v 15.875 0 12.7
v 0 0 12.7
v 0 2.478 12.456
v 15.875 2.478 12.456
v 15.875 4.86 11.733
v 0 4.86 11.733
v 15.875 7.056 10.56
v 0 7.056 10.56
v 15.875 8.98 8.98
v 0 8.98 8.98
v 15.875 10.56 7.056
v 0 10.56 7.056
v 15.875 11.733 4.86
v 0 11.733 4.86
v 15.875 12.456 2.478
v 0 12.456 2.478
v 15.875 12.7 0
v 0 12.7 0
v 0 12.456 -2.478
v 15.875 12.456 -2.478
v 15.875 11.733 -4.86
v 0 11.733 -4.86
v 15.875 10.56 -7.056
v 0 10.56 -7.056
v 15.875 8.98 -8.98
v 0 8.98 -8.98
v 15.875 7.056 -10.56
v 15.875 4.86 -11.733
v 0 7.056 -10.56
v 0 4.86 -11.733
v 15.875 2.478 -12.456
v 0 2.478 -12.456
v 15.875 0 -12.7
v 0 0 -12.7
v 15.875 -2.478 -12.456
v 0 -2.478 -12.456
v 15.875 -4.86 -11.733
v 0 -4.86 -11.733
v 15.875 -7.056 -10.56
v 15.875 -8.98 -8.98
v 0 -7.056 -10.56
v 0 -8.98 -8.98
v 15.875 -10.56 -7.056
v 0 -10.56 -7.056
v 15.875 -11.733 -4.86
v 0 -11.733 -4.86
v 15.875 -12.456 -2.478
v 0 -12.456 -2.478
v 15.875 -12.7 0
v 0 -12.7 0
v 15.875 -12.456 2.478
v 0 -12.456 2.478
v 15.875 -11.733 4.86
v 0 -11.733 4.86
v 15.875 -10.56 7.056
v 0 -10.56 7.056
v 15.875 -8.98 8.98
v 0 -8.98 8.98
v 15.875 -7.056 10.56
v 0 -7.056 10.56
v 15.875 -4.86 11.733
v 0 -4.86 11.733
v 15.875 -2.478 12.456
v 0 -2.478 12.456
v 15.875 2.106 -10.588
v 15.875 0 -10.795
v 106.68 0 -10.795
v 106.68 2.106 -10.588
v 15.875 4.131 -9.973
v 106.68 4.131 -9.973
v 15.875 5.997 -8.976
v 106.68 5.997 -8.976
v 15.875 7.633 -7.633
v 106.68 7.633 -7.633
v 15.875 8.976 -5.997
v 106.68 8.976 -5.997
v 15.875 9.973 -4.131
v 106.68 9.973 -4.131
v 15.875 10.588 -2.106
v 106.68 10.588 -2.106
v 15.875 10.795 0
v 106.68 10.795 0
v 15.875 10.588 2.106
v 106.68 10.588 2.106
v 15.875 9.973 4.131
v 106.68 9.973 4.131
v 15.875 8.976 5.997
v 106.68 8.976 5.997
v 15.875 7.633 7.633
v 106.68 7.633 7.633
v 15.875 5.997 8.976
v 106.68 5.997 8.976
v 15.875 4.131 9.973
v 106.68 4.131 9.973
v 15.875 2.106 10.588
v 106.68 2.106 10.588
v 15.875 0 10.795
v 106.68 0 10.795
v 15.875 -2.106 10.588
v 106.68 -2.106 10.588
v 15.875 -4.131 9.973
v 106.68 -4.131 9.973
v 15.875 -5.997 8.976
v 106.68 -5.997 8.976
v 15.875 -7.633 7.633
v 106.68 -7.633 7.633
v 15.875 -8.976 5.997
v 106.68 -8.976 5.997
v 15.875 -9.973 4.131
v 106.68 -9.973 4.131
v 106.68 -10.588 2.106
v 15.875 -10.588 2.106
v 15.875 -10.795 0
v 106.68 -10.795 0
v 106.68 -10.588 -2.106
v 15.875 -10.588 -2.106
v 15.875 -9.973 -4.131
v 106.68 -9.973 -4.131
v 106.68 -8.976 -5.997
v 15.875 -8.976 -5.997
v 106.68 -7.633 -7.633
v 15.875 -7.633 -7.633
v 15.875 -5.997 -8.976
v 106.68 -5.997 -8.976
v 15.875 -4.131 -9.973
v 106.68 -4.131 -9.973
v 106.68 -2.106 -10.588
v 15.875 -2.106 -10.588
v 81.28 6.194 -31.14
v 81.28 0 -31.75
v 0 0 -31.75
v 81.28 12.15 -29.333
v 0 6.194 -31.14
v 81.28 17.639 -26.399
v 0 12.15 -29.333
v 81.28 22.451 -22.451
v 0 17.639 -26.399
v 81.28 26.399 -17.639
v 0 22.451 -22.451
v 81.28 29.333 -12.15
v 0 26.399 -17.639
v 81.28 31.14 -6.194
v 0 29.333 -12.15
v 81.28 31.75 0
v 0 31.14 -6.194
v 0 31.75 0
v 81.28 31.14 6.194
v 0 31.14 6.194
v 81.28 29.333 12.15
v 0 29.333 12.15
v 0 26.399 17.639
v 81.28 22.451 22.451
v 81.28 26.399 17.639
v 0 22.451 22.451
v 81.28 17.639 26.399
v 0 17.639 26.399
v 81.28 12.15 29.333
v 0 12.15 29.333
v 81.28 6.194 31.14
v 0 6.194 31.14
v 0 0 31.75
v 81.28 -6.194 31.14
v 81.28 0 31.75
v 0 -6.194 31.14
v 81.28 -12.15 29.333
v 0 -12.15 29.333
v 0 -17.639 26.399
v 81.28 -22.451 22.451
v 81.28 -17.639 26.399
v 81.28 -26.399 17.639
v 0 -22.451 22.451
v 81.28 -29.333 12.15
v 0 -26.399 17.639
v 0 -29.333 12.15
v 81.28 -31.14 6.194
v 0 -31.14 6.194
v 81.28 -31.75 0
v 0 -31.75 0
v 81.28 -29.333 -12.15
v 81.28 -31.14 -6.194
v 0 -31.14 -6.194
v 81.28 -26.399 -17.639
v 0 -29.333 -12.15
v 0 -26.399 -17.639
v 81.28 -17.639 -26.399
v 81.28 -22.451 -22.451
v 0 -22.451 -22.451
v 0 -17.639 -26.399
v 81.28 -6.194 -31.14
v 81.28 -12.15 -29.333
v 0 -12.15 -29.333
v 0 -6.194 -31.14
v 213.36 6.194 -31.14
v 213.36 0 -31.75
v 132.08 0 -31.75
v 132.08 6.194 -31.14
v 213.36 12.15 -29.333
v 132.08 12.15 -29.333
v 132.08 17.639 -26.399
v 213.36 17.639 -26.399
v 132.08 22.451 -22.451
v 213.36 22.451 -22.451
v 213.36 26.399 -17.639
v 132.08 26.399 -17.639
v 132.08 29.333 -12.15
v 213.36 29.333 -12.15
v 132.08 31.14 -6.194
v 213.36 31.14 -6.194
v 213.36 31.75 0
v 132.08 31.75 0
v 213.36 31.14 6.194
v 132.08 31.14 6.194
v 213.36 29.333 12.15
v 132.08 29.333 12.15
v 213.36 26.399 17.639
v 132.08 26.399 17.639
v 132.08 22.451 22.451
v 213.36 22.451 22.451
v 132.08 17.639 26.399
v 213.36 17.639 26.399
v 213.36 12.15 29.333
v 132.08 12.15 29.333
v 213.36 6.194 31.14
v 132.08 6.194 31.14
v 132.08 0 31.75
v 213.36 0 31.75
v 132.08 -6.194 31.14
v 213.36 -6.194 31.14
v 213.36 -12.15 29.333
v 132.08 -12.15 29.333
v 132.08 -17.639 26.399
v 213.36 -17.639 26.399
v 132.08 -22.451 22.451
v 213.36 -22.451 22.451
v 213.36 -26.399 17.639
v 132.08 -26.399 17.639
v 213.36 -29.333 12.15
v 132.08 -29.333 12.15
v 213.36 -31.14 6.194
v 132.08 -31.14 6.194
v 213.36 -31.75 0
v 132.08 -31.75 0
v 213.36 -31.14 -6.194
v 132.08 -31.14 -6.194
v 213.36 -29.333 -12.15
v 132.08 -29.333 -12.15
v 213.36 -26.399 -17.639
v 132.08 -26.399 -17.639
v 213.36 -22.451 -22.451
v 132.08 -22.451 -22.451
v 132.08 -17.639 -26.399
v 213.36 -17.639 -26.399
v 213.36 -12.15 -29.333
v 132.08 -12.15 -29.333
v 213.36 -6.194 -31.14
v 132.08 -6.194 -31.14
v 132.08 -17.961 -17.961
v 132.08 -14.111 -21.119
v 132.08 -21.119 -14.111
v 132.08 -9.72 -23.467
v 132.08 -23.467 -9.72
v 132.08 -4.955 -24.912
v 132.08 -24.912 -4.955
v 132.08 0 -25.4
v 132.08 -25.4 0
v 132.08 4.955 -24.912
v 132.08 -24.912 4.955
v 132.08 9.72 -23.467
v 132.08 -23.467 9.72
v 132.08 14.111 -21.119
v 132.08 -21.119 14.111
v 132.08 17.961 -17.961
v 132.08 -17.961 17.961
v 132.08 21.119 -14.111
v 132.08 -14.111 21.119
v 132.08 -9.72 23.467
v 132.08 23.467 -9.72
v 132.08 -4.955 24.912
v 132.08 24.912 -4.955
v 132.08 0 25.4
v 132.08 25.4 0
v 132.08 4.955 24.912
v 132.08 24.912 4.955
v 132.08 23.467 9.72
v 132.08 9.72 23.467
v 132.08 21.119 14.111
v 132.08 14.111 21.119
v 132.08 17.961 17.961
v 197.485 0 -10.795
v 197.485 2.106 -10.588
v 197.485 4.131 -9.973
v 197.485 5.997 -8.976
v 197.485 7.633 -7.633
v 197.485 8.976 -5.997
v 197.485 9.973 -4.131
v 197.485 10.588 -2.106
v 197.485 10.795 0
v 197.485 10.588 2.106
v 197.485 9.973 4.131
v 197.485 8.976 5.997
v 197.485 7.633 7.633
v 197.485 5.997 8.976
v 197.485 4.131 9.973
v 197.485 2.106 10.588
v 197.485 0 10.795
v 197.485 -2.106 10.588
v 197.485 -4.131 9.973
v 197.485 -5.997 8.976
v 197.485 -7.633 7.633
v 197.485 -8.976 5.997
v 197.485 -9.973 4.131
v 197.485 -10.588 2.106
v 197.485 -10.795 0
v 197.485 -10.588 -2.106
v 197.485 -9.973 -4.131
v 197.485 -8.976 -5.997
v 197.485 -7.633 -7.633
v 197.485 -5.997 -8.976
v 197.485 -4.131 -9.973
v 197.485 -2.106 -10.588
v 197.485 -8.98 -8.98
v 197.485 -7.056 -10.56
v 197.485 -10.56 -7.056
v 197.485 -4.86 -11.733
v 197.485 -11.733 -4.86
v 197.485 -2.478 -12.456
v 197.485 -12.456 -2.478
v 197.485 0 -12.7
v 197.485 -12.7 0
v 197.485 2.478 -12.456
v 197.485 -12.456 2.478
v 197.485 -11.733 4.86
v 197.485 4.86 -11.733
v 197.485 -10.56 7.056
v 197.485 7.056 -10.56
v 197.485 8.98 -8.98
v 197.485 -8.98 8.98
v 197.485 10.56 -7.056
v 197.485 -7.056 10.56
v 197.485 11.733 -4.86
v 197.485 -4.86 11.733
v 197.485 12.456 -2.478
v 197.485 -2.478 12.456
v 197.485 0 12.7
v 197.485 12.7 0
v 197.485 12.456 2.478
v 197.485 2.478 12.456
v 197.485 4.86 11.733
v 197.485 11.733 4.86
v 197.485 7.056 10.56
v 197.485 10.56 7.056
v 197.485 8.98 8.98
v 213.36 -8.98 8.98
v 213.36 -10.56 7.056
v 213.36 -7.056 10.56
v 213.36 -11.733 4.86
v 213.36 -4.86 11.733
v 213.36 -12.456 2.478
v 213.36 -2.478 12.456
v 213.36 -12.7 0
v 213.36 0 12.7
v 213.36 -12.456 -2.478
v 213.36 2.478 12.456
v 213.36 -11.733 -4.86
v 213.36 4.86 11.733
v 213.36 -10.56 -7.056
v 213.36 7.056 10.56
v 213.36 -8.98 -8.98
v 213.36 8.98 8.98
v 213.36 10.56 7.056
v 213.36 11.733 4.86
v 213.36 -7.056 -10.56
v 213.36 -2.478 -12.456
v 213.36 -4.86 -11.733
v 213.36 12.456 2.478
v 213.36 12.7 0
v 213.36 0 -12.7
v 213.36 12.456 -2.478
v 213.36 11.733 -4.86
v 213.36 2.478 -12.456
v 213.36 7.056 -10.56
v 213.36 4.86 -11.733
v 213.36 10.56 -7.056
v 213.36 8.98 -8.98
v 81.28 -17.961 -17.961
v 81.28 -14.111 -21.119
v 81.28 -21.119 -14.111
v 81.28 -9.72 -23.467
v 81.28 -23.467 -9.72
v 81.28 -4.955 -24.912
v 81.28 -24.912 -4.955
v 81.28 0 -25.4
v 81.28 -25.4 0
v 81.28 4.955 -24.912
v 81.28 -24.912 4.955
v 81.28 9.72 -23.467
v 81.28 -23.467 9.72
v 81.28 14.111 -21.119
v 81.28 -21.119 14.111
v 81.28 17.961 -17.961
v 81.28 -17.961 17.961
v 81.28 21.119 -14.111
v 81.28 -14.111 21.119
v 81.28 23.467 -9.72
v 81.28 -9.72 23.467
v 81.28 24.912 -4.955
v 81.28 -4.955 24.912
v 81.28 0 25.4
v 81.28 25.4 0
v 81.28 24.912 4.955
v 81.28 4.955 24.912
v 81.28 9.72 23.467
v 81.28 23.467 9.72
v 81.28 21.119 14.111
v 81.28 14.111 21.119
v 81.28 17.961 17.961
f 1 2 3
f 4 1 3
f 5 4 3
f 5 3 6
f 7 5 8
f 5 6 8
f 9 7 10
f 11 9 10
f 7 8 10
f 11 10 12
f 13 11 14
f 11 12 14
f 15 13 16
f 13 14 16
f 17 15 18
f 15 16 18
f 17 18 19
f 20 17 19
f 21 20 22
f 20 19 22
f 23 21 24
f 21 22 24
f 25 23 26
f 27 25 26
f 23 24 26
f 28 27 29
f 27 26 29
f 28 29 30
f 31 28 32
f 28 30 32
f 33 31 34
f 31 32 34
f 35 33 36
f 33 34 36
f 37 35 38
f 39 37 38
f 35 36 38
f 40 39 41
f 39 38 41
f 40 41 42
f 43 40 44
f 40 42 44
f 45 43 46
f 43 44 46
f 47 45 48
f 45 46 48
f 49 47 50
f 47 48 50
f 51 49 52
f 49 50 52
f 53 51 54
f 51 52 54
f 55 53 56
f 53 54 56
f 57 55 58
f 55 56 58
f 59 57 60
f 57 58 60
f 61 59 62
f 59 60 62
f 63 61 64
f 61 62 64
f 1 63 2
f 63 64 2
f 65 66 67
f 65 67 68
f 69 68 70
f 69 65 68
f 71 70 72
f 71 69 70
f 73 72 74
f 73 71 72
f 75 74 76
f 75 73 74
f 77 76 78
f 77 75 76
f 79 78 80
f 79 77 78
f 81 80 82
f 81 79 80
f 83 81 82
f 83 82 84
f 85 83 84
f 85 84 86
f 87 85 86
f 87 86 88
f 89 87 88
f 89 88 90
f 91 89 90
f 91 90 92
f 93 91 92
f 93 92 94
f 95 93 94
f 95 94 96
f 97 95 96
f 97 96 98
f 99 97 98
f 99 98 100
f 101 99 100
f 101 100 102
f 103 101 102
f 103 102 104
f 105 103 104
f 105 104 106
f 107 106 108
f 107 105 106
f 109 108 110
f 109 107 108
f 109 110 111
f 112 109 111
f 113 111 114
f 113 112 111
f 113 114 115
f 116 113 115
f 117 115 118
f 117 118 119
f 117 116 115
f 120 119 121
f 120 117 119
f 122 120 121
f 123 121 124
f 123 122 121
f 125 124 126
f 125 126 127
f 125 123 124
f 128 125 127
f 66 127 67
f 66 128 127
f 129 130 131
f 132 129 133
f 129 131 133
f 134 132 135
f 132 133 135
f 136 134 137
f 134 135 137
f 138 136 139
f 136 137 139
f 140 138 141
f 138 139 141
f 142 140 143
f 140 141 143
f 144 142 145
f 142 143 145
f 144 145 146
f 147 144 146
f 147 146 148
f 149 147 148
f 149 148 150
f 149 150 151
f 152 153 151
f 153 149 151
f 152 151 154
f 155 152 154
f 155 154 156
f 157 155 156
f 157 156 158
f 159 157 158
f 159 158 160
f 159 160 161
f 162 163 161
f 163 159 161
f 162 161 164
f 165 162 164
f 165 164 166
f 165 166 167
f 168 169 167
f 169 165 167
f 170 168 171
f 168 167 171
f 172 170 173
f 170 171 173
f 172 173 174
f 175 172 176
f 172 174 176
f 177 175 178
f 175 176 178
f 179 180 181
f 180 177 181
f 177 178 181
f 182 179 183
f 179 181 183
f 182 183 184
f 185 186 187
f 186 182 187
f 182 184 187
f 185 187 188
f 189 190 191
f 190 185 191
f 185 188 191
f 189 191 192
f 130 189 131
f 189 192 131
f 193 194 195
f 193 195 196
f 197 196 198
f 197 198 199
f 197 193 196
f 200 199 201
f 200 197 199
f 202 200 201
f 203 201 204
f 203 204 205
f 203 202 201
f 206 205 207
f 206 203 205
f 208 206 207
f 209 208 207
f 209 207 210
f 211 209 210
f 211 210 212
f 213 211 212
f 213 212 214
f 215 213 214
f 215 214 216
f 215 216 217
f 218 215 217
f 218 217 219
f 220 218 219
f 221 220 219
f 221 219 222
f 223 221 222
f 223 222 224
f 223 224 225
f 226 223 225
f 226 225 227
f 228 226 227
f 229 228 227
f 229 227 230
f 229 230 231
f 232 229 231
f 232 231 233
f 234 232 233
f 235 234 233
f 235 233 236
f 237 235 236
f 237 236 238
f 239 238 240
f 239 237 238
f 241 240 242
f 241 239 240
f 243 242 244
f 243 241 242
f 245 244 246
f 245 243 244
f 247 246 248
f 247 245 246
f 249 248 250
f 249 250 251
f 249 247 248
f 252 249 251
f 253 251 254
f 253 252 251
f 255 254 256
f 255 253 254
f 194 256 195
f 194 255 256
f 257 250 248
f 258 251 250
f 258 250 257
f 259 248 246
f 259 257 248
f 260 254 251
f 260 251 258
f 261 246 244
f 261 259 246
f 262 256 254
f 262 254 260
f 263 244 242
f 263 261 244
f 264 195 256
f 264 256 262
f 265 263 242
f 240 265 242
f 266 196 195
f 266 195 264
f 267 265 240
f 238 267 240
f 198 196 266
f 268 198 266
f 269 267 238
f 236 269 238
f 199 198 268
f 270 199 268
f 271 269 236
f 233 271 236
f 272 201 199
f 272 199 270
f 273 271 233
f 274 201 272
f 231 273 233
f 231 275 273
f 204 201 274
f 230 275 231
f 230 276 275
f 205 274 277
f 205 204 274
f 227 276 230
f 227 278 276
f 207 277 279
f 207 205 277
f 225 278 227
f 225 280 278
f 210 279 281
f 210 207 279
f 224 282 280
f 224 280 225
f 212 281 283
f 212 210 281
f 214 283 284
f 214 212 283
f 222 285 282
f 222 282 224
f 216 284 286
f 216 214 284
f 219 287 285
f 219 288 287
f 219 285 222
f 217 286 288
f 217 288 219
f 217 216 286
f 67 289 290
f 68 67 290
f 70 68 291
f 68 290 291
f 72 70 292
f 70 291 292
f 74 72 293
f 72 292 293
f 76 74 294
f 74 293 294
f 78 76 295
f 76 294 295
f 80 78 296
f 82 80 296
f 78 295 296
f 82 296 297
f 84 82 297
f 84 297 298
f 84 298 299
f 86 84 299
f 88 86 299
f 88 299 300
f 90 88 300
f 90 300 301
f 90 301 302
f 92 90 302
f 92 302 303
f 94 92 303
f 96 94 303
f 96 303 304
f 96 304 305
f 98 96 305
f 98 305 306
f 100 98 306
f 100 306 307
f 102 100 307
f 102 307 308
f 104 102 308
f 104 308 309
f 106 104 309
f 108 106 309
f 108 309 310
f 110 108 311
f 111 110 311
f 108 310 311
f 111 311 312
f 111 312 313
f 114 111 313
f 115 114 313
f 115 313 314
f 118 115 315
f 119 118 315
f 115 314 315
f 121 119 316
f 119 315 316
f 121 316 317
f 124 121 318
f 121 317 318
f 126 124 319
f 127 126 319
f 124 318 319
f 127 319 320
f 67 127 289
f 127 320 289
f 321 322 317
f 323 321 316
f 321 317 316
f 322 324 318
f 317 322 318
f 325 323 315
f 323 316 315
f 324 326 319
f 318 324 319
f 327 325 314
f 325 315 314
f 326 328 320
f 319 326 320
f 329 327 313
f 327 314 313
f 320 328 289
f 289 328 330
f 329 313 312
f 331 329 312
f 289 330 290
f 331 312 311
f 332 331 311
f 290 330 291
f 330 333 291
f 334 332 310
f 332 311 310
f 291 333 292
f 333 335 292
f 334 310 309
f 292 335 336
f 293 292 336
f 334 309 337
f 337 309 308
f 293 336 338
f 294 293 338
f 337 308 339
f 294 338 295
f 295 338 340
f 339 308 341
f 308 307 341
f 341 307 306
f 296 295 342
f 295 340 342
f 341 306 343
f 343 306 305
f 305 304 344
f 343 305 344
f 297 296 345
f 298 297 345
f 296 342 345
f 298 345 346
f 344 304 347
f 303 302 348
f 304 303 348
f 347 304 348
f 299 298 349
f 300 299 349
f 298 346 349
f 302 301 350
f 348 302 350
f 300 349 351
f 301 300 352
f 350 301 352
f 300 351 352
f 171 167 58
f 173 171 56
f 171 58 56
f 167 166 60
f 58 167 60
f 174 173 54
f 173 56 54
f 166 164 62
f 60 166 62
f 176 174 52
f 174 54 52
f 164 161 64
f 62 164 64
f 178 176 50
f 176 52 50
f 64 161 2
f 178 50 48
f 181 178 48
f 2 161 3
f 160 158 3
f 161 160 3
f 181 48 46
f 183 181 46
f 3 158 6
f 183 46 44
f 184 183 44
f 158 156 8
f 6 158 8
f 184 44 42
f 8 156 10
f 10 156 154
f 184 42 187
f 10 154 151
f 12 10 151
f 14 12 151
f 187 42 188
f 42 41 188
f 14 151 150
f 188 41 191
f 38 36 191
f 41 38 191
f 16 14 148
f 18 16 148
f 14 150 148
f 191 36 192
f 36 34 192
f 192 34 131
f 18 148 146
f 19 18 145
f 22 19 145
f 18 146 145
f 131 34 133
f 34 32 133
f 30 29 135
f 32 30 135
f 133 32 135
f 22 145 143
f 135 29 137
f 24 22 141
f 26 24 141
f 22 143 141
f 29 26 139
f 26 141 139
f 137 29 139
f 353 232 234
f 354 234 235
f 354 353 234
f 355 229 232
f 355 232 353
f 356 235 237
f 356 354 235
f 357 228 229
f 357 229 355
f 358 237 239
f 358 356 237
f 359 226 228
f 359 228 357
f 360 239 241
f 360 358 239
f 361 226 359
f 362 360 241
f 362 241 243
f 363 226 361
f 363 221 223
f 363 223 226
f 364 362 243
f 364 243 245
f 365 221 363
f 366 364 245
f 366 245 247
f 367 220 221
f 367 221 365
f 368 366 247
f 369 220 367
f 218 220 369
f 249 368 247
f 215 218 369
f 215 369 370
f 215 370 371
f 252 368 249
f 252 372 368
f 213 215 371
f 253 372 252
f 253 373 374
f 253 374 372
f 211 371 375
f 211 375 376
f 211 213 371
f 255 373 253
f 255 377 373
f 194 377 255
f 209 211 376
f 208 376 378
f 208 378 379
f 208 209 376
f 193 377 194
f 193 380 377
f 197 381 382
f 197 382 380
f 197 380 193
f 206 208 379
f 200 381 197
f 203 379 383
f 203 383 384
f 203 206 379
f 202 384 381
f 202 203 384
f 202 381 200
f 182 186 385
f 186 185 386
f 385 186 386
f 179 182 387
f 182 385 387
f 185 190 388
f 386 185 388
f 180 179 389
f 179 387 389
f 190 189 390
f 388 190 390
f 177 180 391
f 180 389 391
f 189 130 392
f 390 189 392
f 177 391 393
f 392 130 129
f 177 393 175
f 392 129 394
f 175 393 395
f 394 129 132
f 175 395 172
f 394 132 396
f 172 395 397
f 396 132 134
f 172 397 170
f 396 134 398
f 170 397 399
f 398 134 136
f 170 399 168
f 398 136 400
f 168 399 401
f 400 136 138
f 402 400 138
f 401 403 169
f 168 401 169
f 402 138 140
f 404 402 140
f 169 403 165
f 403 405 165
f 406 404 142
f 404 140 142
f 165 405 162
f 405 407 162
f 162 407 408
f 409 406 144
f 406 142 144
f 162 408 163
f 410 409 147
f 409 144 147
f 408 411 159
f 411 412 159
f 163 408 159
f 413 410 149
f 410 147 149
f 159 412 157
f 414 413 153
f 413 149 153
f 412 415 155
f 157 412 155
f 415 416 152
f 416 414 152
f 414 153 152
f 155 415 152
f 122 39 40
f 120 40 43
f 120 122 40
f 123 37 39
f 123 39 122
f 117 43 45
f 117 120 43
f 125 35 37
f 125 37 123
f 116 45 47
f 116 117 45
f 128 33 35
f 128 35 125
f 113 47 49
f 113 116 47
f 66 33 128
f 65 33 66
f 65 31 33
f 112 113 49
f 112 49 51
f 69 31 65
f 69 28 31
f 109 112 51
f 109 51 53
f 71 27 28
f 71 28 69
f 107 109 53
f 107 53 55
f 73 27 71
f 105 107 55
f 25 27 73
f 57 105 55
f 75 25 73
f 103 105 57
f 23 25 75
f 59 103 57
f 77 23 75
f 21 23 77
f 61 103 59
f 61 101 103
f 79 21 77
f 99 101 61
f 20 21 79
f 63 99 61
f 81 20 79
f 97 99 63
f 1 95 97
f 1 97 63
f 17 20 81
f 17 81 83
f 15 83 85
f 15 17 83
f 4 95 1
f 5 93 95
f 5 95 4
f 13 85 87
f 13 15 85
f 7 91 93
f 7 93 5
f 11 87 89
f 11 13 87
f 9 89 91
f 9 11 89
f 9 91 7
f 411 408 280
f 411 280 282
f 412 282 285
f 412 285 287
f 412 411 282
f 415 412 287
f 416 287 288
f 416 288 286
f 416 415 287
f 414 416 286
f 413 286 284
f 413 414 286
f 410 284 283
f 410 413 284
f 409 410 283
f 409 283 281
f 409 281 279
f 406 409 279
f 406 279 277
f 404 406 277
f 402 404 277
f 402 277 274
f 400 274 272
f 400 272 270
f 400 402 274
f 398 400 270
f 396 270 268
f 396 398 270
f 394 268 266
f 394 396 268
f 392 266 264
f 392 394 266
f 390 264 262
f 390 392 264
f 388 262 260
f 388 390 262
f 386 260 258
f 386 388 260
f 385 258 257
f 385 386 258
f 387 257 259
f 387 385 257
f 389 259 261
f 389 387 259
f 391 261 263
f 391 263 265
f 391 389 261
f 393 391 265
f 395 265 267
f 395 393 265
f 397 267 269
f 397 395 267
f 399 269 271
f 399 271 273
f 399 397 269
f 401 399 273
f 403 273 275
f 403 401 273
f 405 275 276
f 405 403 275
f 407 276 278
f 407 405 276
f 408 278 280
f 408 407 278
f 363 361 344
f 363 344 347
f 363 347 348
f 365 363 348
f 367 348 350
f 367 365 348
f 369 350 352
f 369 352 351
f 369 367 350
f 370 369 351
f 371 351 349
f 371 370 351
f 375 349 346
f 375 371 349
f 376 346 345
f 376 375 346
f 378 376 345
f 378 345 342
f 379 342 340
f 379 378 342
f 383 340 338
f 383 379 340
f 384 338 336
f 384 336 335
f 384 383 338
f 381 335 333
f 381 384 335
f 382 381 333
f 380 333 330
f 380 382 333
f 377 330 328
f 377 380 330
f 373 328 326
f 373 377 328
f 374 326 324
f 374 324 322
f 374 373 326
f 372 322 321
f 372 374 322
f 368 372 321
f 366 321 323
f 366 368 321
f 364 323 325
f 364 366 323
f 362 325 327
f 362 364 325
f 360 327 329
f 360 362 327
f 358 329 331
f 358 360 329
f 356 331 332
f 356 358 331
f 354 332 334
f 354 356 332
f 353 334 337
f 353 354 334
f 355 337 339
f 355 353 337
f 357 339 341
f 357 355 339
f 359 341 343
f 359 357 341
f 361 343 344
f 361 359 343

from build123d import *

# Parameters (mm, degrees)
SKETCH1_R           = 31.75
SKETCH1_R_2         = 10.795
BOSS_EXTRUDE1_DEPTH = 106.68
SKETCH2_R           = 12.7
CUT_EXTRUDE1_DEPTH  = 15.875
CUT_EXTRUDE2_START  = -81.28
SKETCH3_OUTSIDE_W   = 111.798
SKETCH3_OUTSIDE_H   = 111.798
SKETCH3_OUTSIDE_R   = 25.4
CUT_EXTRUDE2_DEPTH  = 50.8


with BuildPart() as part:
    # Sketch1 → Boss-Extrude1 (new body)
    with BuildSketch(Plane(origin=(0, 0, 0), x_dir=(0, 0, -1), z_dir=(1, 0, 0))):
        Circle(SKETCH1_R)
        Circle(SKETCH1_R_2, mode=Mode.SUBTRACT)
    boss_extrude1 = extrude(amount=BOSS_EXTRUDE1_DEPTH)

    # Sketch2 → Cut-Extrude1 (cut)
    with BuildSketch(Plane.ZY):
        Circle(SKETCH2_R)
    cut_extrude1 = extrude(amount=-CUT_EXTRUDE1_DEPTH, mode=Mode.SUBTRACT)

    # Mirror1: Boss-Extrude1, Cut-Extrude1 across plane
    add(boss_extrude1.mirror(Plane(origin=(106.68, 0, 0), x_dir=(0, 0, 1), z_dir=(1, 0, 0))))
    add(cut_extrude1.mirror(Plane(origin=(106.68, 0, 0), x_dir=(0, 0, 1), z_dir=(1, 0, 0))), mode=Mode.SUBTRACT)

    # Sketch3 outside → Cut-Extrude2 (cut)
    with BuildSketch(Plane.ZY.offset(CUT_EXTRUDE2_START)):
        Rectangle(SKETCH3_OUTSIDE_W, SKETCH3_OUTSIDE_H)
        Circle(SKETCH3_OUTSIDE_R, mode=Mode.SUBTRACT)
    extrude(amount=-CUT_EXTRUDE2_DEPTH, mode=Mode.SUBTRACT)


solid = part.part
